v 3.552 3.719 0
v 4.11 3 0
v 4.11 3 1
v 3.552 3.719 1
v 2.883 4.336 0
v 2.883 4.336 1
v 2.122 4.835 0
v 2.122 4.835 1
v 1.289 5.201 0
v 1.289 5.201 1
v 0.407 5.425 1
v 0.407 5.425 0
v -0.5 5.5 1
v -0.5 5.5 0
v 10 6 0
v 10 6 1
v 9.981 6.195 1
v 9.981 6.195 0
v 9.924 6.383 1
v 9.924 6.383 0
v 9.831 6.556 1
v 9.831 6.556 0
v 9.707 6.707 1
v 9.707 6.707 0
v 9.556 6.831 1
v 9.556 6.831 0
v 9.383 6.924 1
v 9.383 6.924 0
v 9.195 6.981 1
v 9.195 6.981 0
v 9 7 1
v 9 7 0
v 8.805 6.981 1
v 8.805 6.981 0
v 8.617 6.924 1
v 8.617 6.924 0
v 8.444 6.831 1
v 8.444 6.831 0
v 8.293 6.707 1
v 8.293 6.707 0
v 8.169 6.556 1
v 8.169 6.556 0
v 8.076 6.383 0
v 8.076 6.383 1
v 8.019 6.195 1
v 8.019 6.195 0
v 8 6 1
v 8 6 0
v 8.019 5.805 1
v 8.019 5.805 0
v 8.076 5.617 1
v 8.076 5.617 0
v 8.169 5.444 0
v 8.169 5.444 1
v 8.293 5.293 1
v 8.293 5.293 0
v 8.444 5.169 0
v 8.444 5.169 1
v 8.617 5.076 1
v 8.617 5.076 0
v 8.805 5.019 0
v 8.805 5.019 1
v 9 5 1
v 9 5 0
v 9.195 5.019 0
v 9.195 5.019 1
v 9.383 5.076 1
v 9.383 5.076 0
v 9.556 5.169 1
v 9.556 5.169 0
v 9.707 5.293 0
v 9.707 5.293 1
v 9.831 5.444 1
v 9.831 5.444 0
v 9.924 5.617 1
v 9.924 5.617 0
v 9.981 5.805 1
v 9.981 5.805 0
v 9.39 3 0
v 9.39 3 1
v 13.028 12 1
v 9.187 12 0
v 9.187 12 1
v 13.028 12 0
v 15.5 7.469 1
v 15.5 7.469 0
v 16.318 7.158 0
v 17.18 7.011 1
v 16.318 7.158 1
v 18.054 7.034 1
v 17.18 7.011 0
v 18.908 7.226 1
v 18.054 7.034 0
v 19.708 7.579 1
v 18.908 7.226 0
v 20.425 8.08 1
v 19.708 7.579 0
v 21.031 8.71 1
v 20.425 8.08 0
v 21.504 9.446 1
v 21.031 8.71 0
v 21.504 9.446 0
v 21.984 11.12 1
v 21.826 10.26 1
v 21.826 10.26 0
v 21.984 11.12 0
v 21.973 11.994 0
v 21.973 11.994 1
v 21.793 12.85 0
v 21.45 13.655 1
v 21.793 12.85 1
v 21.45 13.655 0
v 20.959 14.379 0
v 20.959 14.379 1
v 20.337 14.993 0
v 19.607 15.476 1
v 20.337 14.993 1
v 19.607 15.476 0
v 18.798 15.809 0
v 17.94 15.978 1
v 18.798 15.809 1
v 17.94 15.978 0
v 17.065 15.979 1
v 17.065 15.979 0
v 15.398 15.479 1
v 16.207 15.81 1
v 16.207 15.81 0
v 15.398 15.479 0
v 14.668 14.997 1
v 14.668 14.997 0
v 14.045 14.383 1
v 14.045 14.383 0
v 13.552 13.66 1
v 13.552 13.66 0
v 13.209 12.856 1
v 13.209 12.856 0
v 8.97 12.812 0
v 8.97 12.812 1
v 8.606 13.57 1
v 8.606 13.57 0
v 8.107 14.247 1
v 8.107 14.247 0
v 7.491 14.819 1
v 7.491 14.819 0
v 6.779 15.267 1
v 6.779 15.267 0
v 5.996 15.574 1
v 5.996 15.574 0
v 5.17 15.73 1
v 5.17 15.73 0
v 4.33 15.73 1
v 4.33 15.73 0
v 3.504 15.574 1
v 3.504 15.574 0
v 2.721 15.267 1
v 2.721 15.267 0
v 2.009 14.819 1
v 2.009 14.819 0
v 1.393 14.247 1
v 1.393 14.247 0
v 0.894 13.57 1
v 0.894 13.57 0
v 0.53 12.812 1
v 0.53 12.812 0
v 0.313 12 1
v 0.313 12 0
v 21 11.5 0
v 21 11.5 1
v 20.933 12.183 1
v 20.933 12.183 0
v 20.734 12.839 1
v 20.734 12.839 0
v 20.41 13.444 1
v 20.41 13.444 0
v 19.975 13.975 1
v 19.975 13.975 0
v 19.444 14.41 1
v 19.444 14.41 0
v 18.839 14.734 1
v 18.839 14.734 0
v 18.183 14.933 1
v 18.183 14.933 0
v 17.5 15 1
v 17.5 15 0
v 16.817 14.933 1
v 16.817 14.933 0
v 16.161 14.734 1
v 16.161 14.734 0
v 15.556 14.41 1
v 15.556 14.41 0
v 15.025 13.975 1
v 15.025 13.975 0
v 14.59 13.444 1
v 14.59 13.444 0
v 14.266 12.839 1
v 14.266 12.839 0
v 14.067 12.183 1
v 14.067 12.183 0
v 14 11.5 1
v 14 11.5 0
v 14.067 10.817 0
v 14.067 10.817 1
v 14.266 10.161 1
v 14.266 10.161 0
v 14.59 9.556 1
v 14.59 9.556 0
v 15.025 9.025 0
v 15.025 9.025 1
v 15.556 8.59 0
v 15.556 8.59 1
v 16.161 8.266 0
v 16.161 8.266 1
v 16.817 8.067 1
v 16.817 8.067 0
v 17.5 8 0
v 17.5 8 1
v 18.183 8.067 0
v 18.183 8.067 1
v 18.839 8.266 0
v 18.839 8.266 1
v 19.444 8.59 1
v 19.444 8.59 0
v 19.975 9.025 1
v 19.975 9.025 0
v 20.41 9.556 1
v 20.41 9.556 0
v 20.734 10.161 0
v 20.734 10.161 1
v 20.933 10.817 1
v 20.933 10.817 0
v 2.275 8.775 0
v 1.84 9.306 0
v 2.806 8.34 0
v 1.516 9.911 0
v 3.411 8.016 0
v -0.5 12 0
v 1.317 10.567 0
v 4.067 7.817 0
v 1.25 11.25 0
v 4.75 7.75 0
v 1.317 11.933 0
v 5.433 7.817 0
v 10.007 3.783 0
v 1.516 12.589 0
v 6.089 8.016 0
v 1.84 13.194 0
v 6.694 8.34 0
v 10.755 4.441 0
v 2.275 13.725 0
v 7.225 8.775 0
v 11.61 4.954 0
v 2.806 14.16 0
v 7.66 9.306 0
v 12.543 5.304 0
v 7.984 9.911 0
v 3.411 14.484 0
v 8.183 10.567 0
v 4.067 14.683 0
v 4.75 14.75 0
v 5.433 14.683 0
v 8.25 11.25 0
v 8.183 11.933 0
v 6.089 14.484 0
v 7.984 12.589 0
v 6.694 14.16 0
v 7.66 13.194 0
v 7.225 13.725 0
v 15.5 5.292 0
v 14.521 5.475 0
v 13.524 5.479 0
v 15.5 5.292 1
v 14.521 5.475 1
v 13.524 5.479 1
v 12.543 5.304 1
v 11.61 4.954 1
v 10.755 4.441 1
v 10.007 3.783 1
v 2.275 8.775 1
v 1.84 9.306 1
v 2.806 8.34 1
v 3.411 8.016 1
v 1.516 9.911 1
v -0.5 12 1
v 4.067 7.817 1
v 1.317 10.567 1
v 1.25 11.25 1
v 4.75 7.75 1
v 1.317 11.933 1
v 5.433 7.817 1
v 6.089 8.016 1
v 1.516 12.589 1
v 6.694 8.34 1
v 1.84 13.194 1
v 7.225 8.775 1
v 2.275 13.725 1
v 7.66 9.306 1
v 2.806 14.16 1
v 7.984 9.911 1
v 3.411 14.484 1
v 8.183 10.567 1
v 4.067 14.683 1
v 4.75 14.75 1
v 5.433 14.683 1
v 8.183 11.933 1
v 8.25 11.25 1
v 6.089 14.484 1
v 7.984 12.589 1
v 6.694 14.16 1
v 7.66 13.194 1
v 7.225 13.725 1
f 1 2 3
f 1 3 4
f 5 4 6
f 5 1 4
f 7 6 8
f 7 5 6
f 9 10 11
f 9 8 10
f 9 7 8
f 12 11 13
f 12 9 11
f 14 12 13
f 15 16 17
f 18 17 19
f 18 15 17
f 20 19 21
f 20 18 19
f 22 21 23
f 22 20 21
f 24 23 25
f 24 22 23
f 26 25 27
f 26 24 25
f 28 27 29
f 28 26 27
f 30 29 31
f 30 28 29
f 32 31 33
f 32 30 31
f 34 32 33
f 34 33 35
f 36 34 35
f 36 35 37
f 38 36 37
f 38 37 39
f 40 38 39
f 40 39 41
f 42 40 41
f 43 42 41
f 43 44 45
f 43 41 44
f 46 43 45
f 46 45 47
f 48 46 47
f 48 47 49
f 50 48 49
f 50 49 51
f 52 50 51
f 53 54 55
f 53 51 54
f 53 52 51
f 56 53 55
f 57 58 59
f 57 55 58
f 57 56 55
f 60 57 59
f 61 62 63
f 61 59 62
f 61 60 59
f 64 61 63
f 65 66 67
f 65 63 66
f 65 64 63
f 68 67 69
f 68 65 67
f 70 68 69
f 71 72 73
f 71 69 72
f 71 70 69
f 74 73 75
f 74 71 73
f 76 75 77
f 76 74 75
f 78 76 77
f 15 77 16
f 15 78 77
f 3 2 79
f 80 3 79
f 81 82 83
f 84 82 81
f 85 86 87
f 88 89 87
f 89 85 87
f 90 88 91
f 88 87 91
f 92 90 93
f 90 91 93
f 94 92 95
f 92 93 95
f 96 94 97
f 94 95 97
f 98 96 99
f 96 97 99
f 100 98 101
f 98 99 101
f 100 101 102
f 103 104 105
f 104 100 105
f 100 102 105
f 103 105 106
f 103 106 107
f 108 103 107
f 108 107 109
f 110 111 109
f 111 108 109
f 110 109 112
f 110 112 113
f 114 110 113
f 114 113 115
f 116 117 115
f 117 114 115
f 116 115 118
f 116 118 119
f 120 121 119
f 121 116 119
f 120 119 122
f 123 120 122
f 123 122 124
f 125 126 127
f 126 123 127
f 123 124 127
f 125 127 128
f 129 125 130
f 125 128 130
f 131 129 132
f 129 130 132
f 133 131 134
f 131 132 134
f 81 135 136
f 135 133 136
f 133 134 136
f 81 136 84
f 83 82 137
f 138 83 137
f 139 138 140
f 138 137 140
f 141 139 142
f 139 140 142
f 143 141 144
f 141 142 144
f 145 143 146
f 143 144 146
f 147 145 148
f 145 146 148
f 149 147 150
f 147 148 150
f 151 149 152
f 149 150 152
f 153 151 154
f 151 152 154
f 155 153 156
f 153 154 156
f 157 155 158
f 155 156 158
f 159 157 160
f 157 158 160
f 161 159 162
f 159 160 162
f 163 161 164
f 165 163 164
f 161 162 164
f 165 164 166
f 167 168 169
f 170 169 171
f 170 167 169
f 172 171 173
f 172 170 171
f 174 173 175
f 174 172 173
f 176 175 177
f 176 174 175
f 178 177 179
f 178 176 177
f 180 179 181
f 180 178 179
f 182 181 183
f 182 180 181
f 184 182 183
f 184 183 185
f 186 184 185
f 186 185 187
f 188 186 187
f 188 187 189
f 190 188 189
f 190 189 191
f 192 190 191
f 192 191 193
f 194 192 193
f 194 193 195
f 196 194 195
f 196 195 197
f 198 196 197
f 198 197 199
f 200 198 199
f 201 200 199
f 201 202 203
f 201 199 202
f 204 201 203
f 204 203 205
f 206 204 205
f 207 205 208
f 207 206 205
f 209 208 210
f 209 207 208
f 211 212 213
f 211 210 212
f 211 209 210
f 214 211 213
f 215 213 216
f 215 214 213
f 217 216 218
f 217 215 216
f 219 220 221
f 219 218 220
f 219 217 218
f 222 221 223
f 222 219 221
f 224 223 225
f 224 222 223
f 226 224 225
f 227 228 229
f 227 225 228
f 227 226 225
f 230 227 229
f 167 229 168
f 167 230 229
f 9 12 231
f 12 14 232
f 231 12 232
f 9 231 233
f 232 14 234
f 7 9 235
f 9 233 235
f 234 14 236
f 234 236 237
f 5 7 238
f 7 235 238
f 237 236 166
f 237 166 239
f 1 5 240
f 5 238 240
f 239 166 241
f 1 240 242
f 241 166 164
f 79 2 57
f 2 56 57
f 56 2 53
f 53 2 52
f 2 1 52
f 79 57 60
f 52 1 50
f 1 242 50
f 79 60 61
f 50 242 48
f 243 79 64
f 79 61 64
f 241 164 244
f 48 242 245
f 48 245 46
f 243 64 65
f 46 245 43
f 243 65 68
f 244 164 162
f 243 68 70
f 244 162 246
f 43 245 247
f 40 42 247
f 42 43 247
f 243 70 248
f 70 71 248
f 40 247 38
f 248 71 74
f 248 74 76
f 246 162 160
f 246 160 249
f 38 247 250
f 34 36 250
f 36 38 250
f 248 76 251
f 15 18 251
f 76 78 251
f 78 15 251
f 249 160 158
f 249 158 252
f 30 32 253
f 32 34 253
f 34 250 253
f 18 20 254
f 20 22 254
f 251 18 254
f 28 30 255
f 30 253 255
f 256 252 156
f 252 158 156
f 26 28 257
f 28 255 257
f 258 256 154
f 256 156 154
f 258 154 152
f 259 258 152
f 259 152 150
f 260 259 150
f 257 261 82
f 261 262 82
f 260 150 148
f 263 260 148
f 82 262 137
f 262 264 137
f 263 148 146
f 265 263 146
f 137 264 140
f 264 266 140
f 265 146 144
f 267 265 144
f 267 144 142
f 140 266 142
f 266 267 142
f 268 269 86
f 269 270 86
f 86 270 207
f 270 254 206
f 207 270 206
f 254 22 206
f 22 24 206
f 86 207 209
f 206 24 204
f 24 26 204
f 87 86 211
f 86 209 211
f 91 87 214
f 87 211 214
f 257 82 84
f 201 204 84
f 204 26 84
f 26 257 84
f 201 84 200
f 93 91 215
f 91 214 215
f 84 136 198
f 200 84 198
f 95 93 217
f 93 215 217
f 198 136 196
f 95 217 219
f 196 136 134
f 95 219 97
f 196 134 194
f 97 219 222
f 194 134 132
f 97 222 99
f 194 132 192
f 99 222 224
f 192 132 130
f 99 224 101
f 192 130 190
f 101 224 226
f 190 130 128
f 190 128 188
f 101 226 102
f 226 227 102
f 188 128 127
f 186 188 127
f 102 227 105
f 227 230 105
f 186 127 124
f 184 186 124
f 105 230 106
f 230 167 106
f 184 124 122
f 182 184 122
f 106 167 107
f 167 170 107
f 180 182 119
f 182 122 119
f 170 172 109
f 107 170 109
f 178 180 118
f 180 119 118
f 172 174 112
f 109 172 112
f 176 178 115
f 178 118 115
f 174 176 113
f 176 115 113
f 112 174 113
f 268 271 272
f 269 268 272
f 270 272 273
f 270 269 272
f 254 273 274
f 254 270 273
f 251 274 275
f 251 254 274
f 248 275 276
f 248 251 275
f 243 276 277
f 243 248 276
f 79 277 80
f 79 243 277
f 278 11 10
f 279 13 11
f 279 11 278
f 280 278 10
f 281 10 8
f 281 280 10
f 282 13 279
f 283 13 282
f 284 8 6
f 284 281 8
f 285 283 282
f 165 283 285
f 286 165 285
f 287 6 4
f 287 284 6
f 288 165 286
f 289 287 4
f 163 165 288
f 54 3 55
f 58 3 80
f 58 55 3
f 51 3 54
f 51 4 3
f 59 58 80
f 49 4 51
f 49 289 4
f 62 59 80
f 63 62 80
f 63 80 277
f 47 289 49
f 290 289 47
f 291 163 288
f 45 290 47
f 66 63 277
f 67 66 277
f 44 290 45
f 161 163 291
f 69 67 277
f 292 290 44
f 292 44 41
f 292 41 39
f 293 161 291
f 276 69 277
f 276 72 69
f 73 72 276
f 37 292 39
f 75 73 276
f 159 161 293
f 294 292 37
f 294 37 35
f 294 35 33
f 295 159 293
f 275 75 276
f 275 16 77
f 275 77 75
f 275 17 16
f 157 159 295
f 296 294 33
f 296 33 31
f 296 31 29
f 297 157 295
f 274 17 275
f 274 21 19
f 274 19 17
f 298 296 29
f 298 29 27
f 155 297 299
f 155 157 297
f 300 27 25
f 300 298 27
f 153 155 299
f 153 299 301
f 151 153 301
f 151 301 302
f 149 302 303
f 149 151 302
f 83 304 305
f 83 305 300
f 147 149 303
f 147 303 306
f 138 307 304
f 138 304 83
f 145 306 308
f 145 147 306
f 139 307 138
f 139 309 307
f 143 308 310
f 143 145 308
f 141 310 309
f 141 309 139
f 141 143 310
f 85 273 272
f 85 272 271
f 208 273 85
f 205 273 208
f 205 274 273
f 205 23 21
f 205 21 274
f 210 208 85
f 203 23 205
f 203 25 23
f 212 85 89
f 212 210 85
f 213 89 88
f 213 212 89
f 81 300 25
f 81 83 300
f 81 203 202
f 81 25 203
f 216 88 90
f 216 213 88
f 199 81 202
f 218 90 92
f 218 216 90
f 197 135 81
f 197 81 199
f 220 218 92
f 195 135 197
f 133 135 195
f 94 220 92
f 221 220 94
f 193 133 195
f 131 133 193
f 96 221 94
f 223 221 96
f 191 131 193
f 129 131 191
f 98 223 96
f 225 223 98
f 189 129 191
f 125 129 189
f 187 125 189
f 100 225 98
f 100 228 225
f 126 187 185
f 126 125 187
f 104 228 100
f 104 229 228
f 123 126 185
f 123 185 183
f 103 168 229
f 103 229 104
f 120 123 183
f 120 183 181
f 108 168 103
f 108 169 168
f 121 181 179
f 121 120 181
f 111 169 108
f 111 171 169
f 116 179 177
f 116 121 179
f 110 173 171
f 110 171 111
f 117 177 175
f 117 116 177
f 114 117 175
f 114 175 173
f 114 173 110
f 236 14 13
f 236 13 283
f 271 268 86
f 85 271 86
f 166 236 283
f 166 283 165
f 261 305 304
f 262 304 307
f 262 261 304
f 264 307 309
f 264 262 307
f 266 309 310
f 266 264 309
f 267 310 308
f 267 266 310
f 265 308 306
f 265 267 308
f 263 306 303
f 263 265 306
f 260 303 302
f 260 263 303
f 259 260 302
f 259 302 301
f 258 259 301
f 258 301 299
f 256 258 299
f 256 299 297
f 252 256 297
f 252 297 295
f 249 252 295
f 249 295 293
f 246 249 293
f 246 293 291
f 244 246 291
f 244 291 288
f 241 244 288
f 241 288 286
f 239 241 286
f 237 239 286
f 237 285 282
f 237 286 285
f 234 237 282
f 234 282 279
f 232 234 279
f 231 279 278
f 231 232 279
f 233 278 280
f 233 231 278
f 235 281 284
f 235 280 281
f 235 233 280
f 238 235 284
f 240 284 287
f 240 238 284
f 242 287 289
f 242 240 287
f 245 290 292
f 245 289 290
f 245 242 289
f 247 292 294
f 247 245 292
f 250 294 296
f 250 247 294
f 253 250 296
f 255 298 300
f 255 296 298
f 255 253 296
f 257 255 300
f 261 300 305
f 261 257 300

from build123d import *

# Parameters (mm, degrees)
CYLINDER002_R     = 1
CYLINDER002_DEPTH = 10
CYLINDER001_R     = 5.5
CYLINDER001_DEPTH = 10
CYLINDER003_R     = 3.5
CYLINDER003_DEPTH = 10
CYLINDER004_R     = 3.5
CYLINDER004_DEPTH = 10
CYLINDER_R        = 5.5
CYLINDER_DEPTH    = 10
CYLINDER005_R     = 4.5
CYLINDER005_DEPTH = 1
CYLINDER006_R     = 4.5
CYLINDER006_DEPTH = 1
BOX_W             = 16
BOX_H             = 9
BOX_DEPTH         = 1


with BuildPart() as cylinder002_post_hole:
    # Cylinder002 → Cylinder002 (new body)
    with BuildSketch(Plane(origin=(9, 6, 0), x_dir=(1, 0, 0), z_dir=(0, 0, 1))):
        Circle(CYLINDER002_R)
    extrude(amount=CYLINDER002_DEPTH)


with BuildPart() as cylinder001_b:
    # Cylinder001 → Cylinder001 (new body)
    with BuildSketch(Plane(origin=(14, 0, 0), x_dir=(1, 0, 0), z_dir=(0, 0, 1))):
        Circle(CYLINDER001_R)
    extrude(amount=CYLINDER001_DEPTH)


with BuildPart() as cylinder003_b2_inner:
    # Cylinder003 → Cylinder003 (new body)
    with BuildSketch(Plane(origin=(17.5, 11.5, 0), x_dir=(1, 0, 0), z_dir=(0, 0, 1))):
        Circle(CYLINDER003_R)
    extrude(amount=CYLINDER003_DEPTH)


with BuildPart() as cylinder004_a2_inner:
    # Cylinder004 → Cylinder004 (new body)
    with BuildSketch(Plane(origin=(4.75, 11.25, 0), x_dir=(1, 0, 0), z_dir=(0, 0, 1))):
        Circle(CYLINDER004_R)
    extrude(amount=CYLINDER004_DEPTH)


with BuildPart() as fusion001:
    # Cylinder → Cylinder (new body)
    with BuildSketch(Plane(origin=(-0.5, 0, 0), x_dir=(1, 0, 0), z_dir=(0, 0, 1))):
        Circle(CYLINDER_R)
    extrude(amount=CYLINDER_DEPTH)

    # Fusion001: union Cylinder002(post_hole), Cylinder001(B), Cylinder003(B2)(inner), Cylinder004(A2)(inner)
    add(cylinder002_post_hole.part)
    add(cylinder001_b.part)
    add(cylinder003_b2_inner.part)
    add(cylinder004_a2_inner.part)


with BuildPart() as cylinder003_b2_outer:
    # Cylinder005 → Cylinder005 (new body)
    with BuildSketch(Plane(origin=(17.5, 11.5, 0), x_dir=(1, 0, 0), z_dir=(0, 0, 1))):
        Circle(CYLINDER005_R)
    extrude(amount=CYLINDER005_DEPTH)


with BuildPart() as cylinder004_a2_outer:
    # Cylinder006 → Cylinder006 (new body)
    with BuildSketch(Plane(origin=(4.75, 11.25, 0), x_dir=(1, 0, 0), z_dir=(0, 0, 1))):
        Circle(CYLINDER006_R)
    extrude(amount=CYLINDER006_DEPTH)


with BuildPart() as cut_button_well:
    # Box → Box (new body)
    with BuildSketch(Plane(origin=(-0.5, 3, 0), x_dir=(1, 0, 0), z_dir=(0, 0, 1))):
        with Locations((8, 4.5)):
            Rectangle(BOX_W, BOX_H)
    extrude(amount=BOX_DEPTH)

    # Fusion: union Cylinder003(B2)(outer), Cylinder004(A2)(outer)
    add(cylinder003_b2_outer.part)
    add(cylinder004_a2_outer.part)

    # Cut: cut Fusion001
    add(fusion001.part, mode=Mode.SUBTRACT)


solid = cut_button_well.part
